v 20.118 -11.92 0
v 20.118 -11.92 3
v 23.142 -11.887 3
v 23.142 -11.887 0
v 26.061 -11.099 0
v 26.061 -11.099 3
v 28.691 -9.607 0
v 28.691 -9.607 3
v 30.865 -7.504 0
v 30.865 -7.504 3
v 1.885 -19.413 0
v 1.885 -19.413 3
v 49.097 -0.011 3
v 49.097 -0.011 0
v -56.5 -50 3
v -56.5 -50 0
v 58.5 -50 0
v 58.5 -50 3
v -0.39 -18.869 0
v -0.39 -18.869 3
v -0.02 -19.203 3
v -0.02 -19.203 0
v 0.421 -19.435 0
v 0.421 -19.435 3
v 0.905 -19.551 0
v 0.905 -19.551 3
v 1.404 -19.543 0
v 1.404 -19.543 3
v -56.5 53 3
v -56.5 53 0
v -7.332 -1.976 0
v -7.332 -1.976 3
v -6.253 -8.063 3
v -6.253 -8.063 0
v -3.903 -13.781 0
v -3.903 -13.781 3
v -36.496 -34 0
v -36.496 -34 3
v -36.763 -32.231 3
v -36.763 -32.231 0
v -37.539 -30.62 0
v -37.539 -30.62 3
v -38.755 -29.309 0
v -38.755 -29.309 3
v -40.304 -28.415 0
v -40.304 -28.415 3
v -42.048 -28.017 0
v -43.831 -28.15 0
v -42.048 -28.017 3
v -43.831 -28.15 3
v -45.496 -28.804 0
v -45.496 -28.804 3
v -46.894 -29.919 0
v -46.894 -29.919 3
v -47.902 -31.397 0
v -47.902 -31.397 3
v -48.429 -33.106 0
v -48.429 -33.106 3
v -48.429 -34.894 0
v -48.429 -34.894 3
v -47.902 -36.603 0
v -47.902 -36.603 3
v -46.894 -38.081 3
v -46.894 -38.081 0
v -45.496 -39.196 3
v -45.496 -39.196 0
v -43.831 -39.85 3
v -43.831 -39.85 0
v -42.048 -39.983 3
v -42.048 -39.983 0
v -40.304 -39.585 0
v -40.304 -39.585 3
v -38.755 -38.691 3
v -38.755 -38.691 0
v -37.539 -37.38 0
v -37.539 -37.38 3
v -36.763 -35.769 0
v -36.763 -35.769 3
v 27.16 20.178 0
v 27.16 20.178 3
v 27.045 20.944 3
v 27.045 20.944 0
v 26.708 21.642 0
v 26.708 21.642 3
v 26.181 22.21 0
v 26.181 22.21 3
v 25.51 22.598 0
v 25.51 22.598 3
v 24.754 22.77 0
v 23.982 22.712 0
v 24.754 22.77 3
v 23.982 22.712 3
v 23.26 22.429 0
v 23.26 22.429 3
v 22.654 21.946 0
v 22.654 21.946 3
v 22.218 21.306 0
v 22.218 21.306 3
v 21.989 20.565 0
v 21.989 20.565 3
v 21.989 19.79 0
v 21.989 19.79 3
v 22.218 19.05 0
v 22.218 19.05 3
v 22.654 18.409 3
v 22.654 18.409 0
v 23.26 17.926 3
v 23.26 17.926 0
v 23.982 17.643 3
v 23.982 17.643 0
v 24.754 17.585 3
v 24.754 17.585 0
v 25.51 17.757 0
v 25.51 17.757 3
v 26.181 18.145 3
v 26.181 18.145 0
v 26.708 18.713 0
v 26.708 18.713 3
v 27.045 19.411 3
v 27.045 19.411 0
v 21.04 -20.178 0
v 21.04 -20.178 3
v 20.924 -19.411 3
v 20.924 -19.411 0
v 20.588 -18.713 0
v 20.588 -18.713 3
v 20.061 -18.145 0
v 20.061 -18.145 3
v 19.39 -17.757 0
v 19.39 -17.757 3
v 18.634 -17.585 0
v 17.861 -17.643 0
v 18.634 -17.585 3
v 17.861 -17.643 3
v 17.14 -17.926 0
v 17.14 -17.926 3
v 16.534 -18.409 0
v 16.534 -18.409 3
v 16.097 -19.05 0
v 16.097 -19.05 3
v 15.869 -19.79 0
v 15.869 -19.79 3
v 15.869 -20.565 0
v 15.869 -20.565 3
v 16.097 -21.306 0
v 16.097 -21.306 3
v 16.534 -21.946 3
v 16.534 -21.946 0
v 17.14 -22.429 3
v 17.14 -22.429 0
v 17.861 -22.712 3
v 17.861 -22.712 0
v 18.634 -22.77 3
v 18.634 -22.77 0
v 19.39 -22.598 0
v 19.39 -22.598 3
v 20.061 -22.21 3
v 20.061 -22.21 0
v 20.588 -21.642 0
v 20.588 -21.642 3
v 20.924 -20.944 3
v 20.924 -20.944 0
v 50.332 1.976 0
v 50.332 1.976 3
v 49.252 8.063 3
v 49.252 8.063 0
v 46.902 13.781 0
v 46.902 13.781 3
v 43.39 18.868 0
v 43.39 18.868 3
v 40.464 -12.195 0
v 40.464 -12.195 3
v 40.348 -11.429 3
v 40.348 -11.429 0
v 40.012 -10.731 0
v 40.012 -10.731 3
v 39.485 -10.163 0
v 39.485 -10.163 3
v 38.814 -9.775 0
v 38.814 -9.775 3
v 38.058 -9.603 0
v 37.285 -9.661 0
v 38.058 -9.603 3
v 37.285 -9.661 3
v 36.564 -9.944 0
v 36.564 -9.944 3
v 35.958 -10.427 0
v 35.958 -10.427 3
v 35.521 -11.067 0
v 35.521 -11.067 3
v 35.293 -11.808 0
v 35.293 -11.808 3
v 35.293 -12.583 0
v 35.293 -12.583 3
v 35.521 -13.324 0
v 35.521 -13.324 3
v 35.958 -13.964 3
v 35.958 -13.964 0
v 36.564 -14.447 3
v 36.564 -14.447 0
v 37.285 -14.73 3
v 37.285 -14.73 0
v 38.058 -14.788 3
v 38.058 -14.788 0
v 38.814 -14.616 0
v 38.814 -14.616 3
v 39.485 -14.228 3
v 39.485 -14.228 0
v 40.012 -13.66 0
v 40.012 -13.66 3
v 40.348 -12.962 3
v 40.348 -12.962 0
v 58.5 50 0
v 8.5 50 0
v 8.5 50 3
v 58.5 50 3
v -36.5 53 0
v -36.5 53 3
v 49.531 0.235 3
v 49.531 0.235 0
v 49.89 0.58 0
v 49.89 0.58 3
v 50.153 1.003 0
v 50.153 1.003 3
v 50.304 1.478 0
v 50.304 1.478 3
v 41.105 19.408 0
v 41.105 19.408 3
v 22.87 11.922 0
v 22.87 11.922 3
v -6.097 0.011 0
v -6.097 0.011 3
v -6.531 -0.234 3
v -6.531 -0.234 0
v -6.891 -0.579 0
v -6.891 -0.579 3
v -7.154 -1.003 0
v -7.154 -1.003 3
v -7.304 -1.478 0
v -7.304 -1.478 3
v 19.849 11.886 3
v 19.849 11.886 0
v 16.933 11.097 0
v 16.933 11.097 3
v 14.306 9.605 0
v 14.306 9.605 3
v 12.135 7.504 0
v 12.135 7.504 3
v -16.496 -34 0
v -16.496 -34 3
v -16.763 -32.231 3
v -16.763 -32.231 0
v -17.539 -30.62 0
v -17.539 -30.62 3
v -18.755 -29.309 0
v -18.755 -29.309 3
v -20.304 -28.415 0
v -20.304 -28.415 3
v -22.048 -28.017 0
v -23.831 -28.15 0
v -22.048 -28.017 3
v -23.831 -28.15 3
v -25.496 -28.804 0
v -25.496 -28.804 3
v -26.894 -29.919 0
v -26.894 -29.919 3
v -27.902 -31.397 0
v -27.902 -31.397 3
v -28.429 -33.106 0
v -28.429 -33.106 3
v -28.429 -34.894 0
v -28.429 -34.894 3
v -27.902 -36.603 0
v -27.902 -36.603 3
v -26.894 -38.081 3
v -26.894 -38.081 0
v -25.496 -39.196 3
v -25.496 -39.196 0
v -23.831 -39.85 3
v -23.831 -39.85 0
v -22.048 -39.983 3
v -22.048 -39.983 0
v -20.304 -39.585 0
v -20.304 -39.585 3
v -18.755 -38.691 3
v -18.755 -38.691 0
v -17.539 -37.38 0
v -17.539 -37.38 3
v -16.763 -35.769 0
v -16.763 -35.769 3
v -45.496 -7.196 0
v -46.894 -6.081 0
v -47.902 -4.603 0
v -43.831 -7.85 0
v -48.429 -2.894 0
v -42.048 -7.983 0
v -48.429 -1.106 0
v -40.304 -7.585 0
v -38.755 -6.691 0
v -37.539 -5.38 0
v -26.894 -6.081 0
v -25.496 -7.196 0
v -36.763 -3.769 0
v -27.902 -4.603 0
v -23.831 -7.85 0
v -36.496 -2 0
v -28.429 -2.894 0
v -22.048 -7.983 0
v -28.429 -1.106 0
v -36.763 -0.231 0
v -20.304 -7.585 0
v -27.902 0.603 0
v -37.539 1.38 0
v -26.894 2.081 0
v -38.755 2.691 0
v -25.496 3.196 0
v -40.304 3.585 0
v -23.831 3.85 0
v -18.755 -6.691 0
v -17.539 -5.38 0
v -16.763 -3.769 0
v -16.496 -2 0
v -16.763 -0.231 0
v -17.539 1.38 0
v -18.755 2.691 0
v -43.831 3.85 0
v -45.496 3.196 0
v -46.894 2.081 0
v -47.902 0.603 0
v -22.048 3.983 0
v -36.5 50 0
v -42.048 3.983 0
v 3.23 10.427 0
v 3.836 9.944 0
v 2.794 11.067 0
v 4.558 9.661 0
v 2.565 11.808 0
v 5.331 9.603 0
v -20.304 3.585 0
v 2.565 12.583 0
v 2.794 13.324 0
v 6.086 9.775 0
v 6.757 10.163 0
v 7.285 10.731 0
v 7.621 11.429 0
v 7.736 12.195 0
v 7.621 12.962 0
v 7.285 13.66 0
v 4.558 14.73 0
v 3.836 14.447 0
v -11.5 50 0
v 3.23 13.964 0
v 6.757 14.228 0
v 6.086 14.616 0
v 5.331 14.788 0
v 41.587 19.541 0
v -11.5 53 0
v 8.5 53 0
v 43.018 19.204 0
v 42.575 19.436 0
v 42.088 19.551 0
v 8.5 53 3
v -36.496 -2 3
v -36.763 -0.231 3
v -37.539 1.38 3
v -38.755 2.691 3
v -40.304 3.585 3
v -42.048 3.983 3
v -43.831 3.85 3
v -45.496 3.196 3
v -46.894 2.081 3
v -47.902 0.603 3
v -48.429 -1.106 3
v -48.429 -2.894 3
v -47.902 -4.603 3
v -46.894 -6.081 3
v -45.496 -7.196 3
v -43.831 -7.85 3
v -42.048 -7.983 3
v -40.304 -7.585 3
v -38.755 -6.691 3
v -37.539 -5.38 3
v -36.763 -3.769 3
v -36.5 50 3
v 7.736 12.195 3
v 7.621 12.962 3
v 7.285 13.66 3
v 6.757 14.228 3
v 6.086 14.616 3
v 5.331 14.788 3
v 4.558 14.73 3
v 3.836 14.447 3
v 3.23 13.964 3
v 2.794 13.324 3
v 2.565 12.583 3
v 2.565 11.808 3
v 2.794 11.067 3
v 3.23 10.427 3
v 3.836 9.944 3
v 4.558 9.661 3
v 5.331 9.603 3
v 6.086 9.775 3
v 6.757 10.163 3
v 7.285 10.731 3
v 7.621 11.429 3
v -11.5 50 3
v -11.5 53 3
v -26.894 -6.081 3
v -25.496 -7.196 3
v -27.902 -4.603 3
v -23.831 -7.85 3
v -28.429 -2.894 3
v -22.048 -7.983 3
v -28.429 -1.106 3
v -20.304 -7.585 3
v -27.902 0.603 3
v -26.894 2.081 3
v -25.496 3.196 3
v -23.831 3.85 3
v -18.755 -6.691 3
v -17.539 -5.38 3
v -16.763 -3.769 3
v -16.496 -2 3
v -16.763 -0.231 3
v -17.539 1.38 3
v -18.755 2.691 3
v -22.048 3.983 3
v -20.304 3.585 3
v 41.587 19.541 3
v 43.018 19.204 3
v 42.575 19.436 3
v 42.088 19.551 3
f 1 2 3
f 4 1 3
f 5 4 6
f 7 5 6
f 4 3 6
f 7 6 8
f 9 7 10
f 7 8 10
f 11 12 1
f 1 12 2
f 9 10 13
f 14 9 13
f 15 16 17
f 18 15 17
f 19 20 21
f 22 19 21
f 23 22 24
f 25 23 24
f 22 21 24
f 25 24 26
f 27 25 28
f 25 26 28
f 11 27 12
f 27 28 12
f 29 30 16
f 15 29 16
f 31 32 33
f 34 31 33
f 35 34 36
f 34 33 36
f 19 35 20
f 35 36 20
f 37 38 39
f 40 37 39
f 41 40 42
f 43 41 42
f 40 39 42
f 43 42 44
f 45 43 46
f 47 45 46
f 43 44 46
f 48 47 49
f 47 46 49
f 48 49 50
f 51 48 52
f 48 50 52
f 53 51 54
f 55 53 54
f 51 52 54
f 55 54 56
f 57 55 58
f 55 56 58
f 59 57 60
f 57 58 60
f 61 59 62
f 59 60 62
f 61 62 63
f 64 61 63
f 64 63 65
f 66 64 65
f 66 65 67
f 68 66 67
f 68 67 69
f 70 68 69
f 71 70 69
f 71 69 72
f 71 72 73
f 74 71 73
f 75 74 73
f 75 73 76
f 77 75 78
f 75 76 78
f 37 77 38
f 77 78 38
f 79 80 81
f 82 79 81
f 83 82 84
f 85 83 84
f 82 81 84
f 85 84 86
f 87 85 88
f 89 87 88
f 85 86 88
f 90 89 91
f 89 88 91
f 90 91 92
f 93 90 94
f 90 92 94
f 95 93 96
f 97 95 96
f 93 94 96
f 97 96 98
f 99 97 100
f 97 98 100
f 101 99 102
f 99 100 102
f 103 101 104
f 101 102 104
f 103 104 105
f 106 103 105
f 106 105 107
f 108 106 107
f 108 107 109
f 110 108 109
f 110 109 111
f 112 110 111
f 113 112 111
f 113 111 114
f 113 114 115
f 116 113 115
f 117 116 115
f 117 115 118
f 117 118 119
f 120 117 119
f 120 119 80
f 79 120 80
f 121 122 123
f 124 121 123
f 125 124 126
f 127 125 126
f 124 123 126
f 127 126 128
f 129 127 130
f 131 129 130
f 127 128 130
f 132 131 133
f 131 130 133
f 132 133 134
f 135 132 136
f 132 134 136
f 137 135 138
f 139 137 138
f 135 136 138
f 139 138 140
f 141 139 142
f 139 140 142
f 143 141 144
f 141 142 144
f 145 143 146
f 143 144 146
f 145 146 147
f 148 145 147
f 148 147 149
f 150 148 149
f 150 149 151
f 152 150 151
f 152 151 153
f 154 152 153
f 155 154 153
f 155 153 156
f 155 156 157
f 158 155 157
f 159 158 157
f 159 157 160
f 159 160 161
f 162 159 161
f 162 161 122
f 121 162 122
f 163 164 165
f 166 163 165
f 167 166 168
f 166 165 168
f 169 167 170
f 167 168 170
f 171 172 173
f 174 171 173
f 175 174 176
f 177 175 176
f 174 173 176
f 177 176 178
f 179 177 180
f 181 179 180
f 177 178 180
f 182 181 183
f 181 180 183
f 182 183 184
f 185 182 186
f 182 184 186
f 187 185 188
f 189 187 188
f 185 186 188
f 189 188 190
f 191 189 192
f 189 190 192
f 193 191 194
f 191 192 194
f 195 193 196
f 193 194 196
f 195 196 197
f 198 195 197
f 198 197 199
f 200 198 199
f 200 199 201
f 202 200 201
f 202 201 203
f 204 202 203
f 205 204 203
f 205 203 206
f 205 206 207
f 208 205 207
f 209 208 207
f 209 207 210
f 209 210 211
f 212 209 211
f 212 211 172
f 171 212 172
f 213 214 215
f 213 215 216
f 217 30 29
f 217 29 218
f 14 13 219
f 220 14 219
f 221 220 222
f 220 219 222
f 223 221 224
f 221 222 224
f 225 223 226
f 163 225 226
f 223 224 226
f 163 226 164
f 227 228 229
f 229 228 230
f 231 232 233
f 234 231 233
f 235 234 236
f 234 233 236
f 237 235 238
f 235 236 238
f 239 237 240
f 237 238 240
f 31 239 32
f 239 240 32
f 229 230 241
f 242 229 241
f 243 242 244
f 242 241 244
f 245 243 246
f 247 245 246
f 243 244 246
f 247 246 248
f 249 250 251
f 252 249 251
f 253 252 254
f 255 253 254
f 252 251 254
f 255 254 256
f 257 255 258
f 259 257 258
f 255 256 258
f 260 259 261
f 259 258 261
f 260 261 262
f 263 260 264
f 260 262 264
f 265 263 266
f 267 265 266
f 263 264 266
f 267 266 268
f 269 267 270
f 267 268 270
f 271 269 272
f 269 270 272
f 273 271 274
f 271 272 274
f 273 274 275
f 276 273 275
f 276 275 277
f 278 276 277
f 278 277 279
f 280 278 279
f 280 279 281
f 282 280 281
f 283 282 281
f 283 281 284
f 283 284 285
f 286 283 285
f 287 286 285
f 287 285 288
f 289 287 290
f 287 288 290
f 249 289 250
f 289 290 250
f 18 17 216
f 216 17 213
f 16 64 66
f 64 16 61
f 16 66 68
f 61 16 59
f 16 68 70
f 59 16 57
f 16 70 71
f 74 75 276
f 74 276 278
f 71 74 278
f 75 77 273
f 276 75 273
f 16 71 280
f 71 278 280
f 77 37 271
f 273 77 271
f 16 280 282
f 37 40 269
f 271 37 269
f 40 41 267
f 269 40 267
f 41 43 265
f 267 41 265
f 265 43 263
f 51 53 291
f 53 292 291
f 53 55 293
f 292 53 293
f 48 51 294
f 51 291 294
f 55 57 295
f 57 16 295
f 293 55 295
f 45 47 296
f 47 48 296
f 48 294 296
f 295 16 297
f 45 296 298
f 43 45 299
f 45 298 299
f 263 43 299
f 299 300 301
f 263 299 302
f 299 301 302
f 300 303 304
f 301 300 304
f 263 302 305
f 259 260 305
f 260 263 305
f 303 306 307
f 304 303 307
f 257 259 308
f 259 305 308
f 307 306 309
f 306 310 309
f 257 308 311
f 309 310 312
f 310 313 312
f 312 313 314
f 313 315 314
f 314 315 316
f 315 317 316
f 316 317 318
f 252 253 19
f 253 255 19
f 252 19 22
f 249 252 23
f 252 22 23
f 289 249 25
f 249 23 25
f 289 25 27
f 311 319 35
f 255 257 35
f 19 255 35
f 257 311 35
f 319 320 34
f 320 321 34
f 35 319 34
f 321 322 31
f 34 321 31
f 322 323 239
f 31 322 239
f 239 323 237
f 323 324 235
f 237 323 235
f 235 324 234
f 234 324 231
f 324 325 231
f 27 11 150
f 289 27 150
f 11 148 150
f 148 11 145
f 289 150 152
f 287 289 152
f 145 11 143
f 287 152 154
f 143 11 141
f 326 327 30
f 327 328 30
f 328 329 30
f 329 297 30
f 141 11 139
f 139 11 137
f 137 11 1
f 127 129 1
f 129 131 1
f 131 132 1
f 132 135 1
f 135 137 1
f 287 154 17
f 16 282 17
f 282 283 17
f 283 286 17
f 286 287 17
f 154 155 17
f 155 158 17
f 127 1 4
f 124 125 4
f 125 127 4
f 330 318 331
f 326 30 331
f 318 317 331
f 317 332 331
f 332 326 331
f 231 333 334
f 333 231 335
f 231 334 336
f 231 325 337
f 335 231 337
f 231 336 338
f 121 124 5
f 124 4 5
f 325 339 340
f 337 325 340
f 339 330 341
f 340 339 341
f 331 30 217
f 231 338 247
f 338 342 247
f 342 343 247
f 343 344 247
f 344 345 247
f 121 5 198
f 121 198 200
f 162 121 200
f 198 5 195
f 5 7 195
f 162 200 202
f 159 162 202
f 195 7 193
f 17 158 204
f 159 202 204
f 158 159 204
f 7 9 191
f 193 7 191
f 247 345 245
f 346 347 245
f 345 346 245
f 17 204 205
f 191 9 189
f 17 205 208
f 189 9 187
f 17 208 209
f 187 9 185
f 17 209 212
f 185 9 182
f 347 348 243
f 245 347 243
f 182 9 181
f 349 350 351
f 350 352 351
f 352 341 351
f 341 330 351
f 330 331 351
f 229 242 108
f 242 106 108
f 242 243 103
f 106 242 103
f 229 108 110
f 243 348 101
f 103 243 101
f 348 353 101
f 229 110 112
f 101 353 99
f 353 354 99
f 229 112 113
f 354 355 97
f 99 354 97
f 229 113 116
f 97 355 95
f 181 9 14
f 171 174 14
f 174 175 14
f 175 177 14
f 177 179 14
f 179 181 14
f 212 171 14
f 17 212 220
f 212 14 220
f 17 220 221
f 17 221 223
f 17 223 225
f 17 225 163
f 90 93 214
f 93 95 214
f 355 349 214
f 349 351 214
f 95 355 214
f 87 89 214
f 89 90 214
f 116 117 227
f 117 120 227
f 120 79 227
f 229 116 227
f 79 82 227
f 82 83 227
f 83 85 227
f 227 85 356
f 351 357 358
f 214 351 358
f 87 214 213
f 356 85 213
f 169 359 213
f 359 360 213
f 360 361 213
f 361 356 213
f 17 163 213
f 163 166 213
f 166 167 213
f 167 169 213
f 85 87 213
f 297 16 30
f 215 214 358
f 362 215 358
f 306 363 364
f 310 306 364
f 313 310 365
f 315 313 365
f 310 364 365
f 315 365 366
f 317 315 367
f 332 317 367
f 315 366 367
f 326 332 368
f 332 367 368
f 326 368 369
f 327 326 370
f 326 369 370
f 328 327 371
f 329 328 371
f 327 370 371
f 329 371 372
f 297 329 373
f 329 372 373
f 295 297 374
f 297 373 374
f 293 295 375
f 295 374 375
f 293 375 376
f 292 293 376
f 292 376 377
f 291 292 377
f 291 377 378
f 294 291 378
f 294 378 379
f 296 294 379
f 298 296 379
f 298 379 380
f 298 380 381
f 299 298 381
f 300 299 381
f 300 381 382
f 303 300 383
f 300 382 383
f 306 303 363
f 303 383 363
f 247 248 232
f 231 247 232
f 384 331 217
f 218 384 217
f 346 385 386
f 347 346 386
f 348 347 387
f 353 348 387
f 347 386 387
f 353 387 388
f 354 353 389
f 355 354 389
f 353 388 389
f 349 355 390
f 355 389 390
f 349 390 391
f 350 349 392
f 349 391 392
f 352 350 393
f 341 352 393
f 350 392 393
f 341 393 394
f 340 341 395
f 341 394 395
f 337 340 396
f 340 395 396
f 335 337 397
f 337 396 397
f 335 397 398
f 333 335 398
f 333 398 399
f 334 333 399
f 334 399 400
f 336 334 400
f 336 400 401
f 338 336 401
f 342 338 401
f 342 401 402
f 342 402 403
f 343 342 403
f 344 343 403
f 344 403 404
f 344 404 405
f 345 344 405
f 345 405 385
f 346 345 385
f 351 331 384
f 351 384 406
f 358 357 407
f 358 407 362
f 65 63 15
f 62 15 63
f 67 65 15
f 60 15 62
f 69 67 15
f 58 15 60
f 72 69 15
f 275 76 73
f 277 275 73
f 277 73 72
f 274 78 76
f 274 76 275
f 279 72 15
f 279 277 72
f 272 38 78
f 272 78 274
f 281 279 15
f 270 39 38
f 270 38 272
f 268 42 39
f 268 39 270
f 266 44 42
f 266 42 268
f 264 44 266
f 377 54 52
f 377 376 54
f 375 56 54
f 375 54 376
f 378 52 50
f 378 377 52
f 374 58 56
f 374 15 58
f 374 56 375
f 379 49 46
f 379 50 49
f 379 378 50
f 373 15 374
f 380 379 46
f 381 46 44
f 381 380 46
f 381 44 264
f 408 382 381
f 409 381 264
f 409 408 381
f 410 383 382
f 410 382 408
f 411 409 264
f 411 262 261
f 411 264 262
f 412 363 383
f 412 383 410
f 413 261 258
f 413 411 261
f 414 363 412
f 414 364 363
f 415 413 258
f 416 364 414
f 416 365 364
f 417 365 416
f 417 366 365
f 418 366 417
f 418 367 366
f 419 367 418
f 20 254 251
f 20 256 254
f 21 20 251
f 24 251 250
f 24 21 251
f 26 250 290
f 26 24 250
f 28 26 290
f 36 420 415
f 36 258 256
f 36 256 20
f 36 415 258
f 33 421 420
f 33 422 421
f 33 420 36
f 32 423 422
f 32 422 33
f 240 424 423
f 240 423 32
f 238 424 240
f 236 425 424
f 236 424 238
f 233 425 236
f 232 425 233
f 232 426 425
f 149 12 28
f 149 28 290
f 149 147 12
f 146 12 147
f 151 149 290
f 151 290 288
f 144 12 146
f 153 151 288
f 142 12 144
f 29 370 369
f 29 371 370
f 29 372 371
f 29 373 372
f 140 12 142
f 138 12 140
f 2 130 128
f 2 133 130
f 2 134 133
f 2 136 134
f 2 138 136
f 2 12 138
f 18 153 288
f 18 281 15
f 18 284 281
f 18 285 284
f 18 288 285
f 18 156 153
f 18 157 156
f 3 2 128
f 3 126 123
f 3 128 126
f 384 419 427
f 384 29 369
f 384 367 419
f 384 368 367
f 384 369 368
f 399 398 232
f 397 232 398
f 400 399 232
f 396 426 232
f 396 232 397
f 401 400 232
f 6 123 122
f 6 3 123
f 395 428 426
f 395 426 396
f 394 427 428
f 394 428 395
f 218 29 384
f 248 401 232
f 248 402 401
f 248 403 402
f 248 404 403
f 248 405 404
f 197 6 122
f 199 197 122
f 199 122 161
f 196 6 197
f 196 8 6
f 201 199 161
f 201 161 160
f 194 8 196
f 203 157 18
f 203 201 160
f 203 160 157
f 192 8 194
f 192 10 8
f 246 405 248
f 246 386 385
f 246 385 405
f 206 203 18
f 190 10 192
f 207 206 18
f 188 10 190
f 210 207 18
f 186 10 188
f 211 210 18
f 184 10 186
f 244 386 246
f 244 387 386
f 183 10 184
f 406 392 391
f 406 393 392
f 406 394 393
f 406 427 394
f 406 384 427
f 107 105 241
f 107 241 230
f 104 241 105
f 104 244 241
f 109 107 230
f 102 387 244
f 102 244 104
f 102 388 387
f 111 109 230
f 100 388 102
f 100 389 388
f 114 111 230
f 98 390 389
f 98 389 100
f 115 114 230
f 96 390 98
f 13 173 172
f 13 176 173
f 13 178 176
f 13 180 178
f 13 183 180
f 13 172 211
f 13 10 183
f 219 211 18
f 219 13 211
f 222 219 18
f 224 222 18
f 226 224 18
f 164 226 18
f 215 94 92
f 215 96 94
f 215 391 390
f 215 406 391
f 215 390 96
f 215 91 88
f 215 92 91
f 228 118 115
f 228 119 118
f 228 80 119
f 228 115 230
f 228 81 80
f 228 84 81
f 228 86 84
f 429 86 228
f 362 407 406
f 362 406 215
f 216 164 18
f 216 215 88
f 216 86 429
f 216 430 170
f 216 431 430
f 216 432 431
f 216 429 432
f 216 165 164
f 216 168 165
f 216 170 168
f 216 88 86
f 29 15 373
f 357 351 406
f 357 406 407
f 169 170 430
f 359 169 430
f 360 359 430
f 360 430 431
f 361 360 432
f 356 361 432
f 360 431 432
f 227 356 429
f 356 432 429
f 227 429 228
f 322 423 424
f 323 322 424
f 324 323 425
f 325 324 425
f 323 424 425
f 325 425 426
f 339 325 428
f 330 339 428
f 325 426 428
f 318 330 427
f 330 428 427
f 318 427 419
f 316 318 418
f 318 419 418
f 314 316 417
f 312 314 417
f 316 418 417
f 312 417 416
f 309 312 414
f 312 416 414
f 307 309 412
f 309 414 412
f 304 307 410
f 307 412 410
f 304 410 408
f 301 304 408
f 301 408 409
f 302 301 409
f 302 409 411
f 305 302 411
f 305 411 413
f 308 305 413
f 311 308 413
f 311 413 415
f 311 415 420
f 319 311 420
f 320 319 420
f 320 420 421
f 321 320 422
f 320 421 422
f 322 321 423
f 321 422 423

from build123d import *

# Parameters (mm, degrees)
SKETCH1_W           = 115
SKETCH1_H           = 100
SKETCH1_W_2         = 20
SKETCH1_H_2         = 3
BOSS_EXTRUDE1_DEPTH = 3
SKETCH2_R           = 6
CUT_EXTRUDE1_DEPTH  = 3
SKETCH3_R           = 2.6
CUT_EXTRUDE2_DEPTH  = 10


with BuildPart() as part:
    # Sketch1 → Boss-Extrude1 (new body)
    with BuildSketch(Plane.XY):
        with Locations((1, 0)):
            Rectangle(SKETCH1_W, SKETCH1_H)
        with Locations((-1.5, 51.5)):
            Rectangle(SKETCH1_W_2, SKETCH1_H_2)
        with Locations((-46.5, 51.5)):
            Rectangle(SKETCH1_W_2, SKETCH1_H_2)
    extrude(amount=BOSS_EXTRUDE1_DEPTH)

    # Sketch2 → Cut-Extrude1 (cut)
    with BuildSketch(Plane.XY.offset(3)):
        with Locations((-42.496090888, -34)):
            Circle(SKETCH2_R)
        with Locations((-42.496090888, -2)):
            Circle(SKETCH2_R)
        with Locations((-22.496090888, -34)):
            Circle(SKETCH2_R)
        with Locations((-22.496090888, -2)):
            Circle(SKETCH2_R)
    extrude(amount=-CUT_EXTRUDE1_DEPTH, mode=Mode.SUBTRACT)

    # Sketch3 → Cut-Extrude2 (cut)
    with BuildSketch(Plane.XY.offset(3)):
        with Locations((24.560133375, 20.17760104)):
            Circle(SKETCH3_R)
        with Locations((37.863702859, -12.19545935)):
            Circle(SKETCH3_R)
        with BuildLine():
            Line((1.884861427, -19.412788021), (20.117628398, -11.920111105))
            ThreePointArc((20.117628398, -11.920111105), (26.061223823, -11.099334991), (30.864513292, -7.503725129))
            Line((30.864513292, -7.503725129), (49.097066309, -0.010527574))
            ThreePointArc((49.097066309, -0.010527574), (50.035092062, 0.783146292), (50.33183638, 1.975519274))
            ThreePointArc((50.33183638, 1.975519274), (48.230377797, 10.984733419), (43.389811543, 18.868323086))
            ThreePointArc((43.389811543, 18.868323086), (42.334905798, 19.508804913), (41.104917855, 19.407944809))
            Line((41.104917855, 19.407944809), (22.86955388, 11.921590589))
            ThreePointArc((22.86955388, 11.921590589), (16.932809638, 11.096881192), (12.135486708, 7.503725129))
            Line((12.135486708, 7.503725129), (-6.097280263, 0.011048213))
            ThreePointArc((-6.097280263, 0.011048213), (-7.035570092, -0.78284909), (-7.33239795, -1.975557752))
            ThreePointArc((-7.33239795, -1.975557752), (-5.230898436, -10.984947373), (-0.3902379, -18.868690592))
            ThreePointArc((-0.3902379, -18.868690592), (0.659469027, -19.508046594), (1.884861427, -19.412788021))
        make_face()
        with Locations((18.439866625, -20.17760104)):
            Circle(SKETCH3_R)
        with Locations((5.136297141, 12.19545935)):
            Circle(SKETCH3_R)
    extrude(amount=-CUT_EXTRUDE2_DEPTH, mode=Mode.SUBTRACT)


solid = part.part
